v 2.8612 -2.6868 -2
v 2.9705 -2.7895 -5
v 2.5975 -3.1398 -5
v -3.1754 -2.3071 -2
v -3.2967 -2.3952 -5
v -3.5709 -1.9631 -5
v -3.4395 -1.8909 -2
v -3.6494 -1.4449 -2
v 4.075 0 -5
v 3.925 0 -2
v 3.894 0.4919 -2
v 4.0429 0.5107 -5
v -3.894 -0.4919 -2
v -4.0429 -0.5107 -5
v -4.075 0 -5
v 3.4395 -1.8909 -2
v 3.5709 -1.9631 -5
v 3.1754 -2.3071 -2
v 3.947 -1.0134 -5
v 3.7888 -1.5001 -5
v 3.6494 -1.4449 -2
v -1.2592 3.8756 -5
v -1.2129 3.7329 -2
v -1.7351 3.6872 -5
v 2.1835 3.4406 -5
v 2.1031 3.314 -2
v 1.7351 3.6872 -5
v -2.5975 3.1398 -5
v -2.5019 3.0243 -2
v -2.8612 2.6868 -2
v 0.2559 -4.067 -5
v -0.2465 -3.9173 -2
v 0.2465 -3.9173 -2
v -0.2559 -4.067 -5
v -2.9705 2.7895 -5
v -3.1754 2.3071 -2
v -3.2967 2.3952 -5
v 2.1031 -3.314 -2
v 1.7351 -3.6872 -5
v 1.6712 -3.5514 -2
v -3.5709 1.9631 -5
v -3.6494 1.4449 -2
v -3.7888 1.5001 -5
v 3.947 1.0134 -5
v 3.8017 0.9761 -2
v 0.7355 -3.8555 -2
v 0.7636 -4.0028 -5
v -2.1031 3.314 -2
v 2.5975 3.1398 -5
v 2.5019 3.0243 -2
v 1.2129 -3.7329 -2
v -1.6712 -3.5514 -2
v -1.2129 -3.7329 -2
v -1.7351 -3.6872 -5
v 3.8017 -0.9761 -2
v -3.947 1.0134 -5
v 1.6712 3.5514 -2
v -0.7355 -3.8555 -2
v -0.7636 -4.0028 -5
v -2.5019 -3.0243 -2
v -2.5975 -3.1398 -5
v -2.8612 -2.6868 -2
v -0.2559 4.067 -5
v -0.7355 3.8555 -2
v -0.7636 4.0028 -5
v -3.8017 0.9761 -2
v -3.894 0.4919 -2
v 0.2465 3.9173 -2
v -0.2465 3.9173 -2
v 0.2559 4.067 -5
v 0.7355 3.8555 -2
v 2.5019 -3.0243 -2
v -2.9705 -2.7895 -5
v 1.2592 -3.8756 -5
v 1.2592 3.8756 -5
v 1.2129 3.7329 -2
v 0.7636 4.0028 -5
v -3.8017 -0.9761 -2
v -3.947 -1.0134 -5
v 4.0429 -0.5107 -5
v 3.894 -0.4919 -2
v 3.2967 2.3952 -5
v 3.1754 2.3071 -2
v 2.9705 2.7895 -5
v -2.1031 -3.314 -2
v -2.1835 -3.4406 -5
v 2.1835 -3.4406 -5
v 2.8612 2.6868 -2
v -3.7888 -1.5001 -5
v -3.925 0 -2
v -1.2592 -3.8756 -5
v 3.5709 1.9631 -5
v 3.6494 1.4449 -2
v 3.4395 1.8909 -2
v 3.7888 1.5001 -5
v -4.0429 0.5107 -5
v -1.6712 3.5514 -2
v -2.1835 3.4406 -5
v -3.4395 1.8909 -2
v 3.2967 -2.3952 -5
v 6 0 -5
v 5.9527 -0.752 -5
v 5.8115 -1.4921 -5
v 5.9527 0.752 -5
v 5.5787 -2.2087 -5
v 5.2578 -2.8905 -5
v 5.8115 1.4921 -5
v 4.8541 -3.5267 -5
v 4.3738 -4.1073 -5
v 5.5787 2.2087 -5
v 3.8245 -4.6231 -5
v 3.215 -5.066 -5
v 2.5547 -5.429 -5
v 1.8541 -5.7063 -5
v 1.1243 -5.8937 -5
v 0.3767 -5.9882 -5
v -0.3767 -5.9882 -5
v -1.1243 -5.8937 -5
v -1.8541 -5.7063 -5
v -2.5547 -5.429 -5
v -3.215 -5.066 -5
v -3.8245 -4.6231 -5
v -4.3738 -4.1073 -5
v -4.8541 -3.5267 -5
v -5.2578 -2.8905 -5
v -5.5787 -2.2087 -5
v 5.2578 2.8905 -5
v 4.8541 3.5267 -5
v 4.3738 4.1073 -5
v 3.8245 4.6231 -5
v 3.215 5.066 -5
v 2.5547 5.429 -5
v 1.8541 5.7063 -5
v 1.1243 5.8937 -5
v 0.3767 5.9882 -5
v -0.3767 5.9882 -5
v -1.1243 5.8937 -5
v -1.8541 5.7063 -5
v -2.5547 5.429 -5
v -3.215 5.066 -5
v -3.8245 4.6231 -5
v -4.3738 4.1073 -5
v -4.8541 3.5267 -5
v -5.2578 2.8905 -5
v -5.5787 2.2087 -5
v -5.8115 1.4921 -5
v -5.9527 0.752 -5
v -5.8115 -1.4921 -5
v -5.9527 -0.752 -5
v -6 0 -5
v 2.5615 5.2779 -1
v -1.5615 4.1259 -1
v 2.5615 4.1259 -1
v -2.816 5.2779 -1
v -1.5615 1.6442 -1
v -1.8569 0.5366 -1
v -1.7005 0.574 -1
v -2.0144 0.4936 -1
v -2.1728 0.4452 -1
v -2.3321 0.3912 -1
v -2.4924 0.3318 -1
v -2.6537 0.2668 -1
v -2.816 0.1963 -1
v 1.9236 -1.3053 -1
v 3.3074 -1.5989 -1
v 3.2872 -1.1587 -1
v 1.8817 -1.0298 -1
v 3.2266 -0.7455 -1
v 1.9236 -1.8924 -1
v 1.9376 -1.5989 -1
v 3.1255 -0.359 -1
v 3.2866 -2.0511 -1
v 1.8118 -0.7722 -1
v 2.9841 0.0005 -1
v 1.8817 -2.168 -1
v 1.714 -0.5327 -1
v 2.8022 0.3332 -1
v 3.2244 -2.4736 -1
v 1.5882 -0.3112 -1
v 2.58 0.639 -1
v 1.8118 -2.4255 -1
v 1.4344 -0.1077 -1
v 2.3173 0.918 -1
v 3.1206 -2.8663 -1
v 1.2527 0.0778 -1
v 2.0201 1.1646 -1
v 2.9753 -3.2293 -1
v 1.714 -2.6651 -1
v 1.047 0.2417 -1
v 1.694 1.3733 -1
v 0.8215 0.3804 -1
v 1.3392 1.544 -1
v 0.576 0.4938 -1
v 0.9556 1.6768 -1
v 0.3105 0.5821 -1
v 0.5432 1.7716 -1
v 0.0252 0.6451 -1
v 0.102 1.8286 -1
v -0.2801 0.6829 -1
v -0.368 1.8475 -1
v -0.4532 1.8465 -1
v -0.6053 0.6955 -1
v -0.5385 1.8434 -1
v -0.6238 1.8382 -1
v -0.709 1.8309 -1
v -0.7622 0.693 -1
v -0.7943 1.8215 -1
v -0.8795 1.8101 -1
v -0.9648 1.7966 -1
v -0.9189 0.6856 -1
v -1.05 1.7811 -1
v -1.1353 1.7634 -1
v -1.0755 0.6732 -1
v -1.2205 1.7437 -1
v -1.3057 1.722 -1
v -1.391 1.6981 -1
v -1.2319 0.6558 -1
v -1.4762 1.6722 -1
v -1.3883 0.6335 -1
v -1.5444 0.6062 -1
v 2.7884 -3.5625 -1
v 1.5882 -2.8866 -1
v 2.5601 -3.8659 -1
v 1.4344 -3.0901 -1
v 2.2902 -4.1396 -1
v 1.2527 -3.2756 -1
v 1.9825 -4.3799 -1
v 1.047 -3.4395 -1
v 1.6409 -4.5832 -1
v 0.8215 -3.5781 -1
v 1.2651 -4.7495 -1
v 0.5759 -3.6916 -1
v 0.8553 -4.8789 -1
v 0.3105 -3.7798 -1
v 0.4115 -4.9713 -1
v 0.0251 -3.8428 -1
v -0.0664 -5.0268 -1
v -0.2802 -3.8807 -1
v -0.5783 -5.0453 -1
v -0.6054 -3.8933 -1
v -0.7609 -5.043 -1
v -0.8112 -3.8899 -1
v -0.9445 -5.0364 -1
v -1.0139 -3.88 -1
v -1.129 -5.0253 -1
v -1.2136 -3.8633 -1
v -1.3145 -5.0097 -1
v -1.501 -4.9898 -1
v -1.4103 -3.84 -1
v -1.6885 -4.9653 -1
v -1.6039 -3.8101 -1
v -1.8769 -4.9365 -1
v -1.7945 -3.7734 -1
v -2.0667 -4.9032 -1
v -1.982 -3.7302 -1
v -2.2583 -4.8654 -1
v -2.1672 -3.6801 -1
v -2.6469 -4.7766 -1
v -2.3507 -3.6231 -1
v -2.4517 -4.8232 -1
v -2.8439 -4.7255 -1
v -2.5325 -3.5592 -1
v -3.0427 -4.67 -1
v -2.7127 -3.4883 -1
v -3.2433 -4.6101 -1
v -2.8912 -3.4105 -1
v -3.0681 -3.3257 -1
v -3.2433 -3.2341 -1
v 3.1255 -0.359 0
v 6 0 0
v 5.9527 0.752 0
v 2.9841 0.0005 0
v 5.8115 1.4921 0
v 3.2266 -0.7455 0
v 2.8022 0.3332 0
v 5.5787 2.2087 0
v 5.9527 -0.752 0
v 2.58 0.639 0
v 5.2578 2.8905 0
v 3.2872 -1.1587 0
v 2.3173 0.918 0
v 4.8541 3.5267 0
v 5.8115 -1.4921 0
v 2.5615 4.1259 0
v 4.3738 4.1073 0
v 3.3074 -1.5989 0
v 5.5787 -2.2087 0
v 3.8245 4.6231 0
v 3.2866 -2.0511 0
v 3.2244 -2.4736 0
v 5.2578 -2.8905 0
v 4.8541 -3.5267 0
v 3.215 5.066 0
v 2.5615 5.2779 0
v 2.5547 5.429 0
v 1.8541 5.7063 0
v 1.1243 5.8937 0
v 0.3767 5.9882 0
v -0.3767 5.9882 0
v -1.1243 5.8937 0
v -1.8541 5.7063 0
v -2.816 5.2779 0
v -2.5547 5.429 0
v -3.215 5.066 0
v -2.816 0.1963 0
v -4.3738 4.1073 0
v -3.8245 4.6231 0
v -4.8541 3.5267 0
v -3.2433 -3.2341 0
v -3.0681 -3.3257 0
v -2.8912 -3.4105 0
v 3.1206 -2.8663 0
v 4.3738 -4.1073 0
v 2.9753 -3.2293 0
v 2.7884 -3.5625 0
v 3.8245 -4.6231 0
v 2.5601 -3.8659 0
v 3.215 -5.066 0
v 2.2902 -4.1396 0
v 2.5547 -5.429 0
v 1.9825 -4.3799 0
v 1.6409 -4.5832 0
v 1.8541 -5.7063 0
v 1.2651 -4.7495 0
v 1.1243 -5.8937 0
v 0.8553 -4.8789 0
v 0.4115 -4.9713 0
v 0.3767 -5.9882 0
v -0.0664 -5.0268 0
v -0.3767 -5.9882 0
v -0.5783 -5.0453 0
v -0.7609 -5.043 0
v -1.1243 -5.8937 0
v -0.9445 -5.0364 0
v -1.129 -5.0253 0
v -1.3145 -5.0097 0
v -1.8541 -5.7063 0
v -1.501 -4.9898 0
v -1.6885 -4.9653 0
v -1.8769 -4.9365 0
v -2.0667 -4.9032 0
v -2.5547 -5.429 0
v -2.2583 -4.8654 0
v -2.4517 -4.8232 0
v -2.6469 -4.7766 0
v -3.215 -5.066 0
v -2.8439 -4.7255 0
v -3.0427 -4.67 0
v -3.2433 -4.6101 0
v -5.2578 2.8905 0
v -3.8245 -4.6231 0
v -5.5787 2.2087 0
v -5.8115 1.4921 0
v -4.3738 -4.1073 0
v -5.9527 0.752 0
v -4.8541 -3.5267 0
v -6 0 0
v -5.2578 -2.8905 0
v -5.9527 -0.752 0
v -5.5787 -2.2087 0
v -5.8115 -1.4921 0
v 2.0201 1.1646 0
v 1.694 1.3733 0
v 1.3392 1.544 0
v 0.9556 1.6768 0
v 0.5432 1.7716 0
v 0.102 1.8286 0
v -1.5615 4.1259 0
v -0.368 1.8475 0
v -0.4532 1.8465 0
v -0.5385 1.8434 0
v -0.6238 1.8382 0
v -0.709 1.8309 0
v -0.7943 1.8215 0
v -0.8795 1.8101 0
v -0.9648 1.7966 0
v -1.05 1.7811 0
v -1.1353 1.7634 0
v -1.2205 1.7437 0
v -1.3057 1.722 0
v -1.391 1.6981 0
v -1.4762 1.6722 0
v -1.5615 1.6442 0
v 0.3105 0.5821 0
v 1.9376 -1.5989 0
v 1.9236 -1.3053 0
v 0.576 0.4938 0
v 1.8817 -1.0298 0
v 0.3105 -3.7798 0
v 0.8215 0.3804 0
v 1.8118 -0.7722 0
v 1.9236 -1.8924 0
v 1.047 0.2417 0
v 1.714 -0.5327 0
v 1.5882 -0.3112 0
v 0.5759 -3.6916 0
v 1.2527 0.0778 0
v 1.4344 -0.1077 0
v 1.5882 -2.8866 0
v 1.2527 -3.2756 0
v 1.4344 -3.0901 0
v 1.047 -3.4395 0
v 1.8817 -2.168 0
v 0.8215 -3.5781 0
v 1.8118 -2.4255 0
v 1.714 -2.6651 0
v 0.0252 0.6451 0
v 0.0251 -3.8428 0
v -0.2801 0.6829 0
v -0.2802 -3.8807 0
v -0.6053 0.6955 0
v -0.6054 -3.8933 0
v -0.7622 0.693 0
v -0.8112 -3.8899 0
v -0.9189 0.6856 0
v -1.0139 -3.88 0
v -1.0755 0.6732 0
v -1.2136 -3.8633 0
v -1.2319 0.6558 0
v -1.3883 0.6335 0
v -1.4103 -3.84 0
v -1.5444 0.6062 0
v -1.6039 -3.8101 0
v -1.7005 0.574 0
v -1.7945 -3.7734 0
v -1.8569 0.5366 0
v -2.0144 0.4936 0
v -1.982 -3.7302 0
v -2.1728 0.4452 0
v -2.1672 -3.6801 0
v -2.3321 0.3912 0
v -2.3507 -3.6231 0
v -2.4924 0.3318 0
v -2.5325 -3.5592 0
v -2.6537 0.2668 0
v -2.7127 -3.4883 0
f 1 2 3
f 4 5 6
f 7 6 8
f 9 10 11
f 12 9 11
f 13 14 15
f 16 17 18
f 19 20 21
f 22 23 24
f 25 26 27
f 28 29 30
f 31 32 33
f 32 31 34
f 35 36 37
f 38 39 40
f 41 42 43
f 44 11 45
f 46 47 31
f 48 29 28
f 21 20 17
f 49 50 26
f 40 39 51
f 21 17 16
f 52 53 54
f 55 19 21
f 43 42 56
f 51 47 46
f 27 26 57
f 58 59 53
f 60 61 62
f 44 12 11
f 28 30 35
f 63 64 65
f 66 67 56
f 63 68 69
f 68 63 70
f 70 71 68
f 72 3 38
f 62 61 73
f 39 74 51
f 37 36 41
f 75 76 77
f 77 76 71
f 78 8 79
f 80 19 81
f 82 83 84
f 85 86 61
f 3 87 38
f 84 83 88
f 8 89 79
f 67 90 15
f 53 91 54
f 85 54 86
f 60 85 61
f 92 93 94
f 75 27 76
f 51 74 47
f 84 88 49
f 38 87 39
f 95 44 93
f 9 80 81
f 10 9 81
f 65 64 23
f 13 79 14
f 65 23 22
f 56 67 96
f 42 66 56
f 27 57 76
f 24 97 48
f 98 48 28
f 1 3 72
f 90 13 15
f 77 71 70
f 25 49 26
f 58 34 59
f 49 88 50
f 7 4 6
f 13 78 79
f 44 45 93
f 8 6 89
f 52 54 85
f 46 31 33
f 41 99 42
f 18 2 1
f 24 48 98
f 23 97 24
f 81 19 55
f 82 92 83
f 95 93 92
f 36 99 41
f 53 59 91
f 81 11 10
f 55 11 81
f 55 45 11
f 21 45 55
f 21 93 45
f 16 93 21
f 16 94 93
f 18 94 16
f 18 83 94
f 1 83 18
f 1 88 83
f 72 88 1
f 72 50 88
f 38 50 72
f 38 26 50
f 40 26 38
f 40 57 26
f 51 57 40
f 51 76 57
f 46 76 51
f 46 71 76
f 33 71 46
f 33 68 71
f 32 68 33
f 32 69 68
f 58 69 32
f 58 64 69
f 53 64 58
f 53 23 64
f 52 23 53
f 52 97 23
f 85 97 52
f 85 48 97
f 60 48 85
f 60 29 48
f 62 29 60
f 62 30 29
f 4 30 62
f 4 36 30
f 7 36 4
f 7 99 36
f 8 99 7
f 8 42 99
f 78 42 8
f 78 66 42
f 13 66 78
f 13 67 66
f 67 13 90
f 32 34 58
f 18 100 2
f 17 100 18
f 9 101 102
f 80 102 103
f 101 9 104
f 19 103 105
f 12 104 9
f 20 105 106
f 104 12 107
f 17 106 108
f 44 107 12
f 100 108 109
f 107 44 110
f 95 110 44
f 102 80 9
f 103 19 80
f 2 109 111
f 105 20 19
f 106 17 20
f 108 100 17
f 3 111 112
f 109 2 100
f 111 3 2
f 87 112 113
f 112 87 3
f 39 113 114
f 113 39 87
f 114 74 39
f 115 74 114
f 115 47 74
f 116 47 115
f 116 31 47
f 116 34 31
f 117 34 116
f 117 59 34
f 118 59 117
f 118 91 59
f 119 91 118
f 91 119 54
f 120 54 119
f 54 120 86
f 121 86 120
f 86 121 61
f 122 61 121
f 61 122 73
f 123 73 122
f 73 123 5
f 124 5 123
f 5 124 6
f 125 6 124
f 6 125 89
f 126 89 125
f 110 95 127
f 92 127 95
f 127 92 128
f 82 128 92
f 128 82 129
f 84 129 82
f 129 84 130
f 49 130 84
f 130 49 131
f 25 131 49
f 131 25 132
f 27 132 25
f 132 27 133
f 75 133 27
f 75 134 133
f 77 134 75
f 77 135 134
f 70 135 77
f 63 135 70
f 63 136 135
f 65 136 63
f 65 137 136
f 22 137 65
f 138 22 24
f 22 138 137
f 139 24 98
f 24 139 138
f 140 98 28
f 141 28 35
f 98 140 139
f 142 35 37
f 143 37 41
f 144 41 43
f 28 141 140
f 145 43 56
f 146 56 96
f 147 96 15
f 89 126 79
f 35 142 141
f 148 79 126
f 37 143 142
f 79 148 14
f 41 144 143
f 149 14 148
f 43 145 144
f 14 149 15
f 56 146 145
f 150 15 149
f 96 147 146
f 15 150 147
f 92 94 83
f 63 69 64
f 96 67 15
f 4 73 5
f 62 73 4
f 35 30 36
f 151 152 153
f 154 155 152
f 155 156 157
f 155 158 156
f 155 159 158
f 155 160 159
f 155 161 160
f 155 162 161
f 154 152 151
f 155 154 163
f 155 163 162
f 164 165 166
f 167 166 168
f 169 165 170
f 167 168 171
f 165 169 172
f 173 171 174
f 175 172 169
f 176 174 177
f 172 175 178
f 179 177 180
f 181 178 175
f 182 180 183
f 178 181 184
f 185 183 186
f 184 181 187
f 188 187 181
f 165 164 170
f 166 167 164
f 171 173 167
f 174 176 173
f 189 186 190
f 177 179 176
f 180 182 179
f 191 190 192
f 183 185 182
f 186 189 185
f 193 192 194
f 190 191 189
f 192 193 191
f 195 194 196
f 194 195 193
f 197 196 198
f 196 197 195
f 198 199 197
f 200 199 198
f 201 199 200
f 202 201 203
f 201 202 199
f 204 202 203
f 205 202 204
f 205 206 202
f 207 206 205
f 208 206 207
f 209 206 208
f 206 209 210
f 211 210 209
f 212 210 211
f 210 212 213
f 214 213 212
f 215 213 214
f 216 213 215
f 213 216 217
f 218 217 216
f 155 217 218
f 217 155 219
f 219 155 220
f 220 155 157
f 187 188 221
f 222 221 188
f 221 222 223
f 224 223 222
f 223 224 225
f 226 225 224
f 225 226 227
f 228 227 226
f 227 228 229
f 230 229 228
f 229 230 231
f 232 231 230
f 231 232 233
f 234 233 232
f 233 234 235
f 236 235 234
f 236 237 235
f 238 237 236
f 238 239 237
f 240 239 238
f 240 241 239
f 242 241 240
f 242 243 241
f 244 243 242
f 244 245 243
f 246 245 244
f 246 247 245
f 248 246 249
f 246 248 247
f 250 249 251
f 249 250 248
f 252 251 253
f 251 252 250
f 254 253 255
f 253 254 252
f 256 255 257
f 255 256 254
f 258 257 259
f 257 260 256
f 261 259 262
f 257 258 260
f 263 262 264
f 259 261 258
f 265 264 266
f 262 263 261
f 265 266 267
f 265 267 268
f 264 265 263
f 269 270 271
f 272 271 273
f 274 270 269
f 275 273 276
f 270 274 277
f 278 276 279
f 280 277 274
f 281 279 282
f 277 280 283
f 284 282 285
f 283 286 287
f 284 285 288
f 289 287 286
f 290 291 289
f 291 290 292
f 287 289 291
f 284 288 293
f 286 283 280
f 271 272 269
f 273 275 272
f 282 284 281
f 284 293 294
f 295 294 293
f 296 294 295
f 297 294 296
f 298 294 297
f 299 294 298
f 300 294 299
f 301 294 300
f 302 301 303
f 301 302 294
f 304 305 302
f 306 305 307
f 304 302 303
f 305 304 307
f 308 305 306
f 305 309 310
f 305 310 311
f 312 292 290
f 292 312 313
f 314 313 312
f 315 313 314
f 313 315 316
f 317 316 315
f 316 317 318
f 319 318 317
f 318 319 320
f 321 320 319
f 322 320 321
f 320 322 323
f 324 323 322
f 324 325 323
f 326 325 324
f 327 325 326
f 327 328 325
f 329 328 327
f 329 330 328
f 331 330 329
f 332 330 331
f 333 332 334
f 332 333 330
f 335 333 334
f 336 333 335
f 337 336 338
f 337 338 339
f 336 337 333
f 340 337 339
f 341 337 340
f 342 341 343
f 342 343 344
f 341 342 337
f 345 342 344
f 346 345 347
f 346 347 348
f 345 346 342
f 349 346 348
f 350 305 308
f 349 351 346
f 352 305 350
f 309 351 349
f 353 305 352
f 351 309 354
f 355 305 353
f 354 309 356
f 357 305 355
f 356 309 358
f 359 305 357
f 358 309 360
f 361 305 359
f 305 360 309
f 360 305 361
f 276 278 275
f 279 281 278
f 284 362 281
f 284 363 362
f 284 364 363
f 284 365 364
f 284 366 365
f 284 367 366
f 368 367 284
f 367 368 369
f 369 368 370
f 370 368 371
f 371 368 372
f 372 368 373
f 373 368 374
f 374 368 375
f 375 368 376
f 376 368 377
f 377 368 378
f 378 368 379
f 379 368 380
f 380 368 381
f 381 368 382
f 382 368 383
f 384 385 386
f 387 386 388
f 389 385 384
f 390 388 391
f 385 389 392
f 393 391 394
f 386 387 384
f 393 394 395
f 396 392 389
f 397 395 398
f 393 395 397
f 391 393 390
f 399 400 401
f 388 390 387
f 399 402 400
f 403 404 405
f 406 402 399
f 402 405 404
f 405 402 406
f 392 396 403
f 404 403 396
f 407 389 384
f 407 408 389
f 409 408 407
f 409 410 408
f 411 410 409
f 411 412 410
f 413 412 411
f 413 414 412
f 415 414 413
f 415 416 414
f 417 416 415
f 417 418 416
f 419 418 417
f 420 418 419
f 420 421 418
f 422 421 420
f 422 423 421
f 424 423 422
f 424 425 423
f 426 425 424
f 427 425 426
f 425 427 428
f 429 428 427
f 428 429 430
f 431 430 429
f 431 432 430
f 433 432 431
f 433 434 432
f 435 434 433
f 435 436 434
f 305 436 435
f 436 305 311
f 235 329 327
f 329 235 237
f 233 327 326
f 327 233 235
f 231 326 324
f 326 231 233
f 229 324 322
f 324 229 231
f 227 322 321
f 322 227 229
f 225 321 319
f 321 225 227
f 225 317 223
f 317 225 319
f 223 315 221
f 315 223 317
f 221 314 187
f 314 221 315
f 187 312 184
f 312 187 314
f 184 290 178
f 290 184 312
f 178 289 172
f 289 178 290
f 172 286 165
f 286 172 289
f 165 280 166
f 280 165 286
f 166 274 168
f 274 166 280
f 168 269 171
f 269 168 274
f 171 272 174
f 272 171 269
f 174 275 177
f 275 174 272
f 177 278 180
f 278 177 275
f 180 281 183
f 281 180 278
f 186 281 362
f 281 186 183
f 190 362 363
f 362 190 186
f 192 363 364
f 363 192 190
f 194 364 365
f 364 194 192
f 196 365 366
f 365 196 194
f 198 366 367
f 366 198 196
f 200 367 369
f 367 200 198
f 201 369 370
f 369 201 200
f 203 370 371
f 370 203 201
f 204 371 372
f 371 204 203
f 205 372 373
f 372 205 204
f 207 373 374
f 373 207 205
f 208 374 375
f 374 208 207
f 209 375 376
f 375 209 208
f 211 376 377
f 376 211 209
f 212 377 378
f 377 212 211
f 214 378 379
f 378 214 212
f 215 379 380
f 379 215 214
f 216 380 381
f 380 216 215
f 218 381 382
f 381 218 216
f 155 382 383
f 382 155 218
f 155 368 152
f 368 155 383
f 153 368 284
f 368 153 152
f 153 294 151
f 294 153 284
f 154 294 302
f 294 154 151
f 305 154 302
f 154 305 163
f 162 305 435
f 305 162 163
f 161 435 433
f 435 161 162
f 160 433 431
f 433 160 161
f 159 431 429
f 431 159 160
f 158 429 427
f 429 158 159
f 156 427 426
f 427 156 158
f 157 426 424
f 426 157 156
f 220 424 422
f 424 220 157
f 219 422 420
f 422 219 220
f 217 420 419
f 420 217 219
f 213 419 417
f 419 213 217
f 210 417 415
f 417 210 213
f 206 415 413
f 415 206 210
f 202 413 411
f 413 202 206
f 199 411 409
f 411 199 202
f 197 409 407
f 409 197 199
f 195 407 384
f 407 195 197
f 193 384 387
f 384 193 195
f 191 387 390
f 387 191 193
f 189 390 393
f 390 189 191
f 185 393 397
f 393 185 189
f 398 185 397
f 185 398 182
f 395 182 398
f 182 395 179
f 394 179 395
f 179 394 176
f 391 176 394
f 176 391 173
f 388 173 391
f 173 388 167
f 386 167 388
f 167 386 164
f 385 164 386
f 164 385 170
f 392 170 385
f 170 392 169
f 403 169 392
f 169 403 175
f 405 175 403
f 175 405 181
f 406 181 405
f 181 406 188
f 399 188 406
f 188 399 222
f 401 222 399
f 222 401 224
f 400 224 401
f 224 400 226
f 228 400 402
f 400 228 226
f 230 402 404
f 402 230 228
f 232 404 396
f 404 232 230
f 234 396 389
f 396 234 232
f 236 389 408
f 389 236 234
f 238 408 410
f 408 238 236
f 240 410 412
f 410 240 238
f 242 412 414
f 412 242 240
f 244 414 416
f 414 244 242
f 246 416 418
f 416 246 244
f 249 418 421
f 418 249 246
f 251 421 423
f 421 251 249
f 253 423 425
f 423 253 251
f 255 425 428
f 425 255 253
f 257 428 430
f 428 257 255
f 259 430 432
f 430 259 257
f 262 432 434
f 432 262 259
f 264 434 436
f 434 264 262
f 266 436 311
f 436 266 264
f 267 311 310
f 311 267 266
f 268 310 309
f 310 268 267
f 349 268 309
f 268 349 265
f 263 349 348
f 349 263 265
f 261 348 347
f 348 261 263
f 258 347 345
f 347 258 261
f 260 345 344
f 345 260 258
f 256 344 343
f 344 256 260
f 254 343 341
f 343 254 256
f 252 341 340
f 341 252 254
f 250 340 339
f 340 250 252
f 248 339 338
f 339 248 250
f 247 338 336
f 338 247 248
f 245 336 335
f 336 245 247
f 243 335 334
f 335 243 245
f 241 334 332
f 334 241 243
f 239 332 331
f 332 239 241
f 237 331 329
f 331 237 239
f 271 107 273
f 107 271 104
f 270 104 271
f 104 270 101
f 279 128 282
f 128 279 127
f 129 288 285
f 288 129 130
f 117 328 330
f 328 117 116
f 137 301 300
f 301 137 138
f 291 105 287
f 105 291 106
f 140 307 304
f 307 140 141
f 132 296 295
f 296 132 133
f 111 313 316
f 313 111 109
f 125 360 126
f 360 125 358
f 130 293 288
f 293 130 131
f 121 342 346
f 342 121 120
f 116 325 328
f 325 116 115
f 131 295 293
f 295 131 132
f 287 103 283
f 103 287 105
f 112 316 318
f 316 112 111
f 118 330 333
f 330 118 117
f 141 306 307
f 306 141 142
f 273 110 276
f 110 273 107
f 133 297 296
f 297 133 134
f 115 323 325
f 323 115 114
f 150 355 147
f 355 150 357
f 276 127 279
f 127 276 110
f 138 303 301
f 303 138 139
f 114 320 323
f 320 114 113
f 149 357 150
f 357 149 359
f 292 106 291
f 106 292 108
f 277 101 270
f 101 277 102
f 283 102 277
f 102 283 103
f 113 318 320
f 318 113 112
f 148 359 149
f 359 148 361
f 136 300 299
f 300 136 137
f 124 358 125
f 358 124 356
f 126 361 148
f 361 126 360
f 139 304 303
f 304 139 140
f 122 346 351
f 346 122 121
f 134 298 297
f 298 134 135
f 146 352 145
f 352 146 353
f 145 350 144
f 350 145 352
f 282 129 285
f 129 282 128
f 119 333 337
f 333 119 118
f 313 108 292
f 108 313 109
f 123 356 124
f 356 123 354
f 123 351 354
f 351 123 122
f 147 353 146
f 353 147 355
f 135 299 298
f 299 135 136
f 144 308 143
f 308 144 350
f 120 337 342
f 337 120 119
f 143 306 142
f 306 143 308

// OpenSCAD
$fn = 50;

difference() {
	union() {
		translate(v = [0, 0, -5.0]) {
			cylinder(h = 5, r = 6.0);
		}
	}
	union() {
		#translate(v = [0, 0, -5.0]) {
			cylinder(h = 3, r1 = 4.075, r2 = 3.925);
		}
		translate(v = [0, 0, -1]) {
			linear_extrude(height = 1) {
				text(font = "Impact", halign = "center", size = 10, text = "5", valign = "center");
			}
		}
	}
}
